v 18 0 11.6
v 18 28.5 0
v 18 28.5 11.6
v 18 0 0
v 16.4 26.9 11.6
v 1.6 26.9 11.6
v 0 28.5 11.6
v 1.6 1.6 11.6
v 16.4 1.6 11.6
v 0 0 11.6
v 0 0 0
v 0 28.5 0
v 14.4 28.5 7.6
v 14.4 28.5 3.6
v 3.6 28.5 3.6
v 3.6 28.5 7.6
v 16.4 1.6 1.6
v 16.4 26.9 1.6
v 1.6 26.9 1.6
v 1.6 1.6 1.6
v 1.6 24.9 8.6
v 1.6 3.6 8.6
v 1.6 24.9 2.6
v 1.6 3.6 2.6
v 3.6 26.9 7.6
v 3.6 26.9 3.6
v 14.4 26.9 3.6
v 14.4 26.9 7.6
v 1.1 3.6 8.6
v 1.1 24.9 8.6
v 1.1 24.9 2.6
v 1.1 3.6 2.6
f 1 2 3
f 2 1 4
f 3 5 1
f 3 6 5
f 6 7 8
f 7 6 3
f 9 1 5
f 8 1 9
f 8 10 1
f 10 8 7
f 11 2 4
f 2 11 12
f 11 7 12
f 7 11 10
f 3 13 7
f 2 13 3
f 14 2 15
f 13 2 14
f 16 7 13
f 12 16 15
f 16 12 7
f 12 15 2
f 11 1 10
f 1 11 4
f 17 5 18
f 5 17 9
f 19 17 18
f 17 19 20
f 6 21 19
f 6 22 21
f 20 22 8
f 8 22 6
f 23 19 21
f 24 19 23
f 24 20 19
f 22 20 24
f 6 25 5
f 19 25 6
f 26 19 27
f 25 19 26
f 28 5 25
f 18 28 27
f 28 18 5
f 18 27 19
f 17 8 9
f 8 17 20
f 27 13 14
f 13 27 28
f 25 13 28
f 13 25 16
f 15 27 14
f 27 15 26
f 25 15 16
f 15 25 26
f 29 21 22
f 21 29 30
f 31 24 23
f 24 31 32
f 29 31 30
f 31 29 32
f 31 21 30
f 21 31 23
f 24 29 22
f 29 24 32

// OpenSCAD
// ESP8266-01 enclosure — a snap-fit box sized for the 14.3mm × 24.8mm module.
// Adjust the variables at the top to fit your module dimensions.

module_w  = 14.8;   // module width  + 0.5mm clearance
module_d  = 25.3;   // module depth  + 0.5mm clearance
module_h  = 8.0;    // module height (with pins)
wall      = 1.6;    // wall thickness
lid_h     = 2.0;    // lid overlap height

// Outer box
difference() {
    cube([module_w + wall*2, module_d + wall*2, module_h + wall + lid_h]);
    // Inner cavity
    translate([wall, wall, wall])
        cube([module_w, module_d, module_h + lid_h + 1]);
    // Antenna cutout (top)
    translate([wall + 2, module_d + wall - 1, wall + 2])
        cube([module_w - 4, 2 + wall + 1, module_h - 4]);
    // Serial header access (side)
    translate([wall - 0.5, wall + 2, wall + 1])
        cube([1 + wall, module_d - 4, module_h - 2]);
}
